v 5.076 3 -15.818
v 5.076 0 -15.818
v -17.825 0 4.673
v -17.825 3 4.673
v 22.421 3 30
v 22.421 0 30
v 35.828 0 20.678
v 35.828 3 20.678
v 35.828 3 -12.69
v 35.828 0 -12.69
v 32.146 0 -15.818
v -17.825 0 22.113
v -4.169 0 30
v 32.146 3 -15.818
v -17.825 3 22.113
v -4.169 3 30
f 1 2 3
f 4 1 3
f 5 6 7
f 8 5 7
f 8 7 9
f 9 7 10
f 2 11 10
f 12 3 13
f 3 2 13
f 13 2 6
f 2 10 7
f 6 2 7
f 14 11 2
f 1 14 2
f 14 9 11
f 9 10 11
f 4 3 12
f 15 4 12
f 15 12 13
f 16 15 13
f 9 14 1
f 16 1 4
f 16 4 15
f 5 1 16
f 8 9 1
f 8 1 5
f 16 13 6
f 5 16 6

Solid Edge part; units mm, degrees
sketch "Sketch1" plane through (0, 0, 0) normal (0, -1, 0) x (1, 0, 0)
  line L0 (-4.1692, 30) -> (22.4208, 30)
  line L1 (22.4208, 30) -> (35.8285, 20.6779)
  line L2 (35.8285, 20.6779) -> (35.8285, -12.6896)
  line L3 (35.8285, -12.6896) -> (32.1463, -15.8179)
  line L4 (32.1463, -15.8179) -> (5.0763, -15.8179)
  line L5 (5.0763, -15.8179) -> (-17.825, 4.6726)
  line L6 (-17.825, 4.6726) -> (-17.825, 22.1126)
  line L7 (-17.825, 22.1126) -> (-4.1692, 30)
  dimension "D1" = 26.59
  dimension "D2" = 17.44
  dimension "D3" = 27.07
  dimension "D4" = 16.33
  dimension "D5" = 4.8317
  dimension "D6" = 33.3675
extrude "Protrusion1" add sketch "Sketch1" against normal blind 3
properties part number "049" material "Acryl, hochfest"
